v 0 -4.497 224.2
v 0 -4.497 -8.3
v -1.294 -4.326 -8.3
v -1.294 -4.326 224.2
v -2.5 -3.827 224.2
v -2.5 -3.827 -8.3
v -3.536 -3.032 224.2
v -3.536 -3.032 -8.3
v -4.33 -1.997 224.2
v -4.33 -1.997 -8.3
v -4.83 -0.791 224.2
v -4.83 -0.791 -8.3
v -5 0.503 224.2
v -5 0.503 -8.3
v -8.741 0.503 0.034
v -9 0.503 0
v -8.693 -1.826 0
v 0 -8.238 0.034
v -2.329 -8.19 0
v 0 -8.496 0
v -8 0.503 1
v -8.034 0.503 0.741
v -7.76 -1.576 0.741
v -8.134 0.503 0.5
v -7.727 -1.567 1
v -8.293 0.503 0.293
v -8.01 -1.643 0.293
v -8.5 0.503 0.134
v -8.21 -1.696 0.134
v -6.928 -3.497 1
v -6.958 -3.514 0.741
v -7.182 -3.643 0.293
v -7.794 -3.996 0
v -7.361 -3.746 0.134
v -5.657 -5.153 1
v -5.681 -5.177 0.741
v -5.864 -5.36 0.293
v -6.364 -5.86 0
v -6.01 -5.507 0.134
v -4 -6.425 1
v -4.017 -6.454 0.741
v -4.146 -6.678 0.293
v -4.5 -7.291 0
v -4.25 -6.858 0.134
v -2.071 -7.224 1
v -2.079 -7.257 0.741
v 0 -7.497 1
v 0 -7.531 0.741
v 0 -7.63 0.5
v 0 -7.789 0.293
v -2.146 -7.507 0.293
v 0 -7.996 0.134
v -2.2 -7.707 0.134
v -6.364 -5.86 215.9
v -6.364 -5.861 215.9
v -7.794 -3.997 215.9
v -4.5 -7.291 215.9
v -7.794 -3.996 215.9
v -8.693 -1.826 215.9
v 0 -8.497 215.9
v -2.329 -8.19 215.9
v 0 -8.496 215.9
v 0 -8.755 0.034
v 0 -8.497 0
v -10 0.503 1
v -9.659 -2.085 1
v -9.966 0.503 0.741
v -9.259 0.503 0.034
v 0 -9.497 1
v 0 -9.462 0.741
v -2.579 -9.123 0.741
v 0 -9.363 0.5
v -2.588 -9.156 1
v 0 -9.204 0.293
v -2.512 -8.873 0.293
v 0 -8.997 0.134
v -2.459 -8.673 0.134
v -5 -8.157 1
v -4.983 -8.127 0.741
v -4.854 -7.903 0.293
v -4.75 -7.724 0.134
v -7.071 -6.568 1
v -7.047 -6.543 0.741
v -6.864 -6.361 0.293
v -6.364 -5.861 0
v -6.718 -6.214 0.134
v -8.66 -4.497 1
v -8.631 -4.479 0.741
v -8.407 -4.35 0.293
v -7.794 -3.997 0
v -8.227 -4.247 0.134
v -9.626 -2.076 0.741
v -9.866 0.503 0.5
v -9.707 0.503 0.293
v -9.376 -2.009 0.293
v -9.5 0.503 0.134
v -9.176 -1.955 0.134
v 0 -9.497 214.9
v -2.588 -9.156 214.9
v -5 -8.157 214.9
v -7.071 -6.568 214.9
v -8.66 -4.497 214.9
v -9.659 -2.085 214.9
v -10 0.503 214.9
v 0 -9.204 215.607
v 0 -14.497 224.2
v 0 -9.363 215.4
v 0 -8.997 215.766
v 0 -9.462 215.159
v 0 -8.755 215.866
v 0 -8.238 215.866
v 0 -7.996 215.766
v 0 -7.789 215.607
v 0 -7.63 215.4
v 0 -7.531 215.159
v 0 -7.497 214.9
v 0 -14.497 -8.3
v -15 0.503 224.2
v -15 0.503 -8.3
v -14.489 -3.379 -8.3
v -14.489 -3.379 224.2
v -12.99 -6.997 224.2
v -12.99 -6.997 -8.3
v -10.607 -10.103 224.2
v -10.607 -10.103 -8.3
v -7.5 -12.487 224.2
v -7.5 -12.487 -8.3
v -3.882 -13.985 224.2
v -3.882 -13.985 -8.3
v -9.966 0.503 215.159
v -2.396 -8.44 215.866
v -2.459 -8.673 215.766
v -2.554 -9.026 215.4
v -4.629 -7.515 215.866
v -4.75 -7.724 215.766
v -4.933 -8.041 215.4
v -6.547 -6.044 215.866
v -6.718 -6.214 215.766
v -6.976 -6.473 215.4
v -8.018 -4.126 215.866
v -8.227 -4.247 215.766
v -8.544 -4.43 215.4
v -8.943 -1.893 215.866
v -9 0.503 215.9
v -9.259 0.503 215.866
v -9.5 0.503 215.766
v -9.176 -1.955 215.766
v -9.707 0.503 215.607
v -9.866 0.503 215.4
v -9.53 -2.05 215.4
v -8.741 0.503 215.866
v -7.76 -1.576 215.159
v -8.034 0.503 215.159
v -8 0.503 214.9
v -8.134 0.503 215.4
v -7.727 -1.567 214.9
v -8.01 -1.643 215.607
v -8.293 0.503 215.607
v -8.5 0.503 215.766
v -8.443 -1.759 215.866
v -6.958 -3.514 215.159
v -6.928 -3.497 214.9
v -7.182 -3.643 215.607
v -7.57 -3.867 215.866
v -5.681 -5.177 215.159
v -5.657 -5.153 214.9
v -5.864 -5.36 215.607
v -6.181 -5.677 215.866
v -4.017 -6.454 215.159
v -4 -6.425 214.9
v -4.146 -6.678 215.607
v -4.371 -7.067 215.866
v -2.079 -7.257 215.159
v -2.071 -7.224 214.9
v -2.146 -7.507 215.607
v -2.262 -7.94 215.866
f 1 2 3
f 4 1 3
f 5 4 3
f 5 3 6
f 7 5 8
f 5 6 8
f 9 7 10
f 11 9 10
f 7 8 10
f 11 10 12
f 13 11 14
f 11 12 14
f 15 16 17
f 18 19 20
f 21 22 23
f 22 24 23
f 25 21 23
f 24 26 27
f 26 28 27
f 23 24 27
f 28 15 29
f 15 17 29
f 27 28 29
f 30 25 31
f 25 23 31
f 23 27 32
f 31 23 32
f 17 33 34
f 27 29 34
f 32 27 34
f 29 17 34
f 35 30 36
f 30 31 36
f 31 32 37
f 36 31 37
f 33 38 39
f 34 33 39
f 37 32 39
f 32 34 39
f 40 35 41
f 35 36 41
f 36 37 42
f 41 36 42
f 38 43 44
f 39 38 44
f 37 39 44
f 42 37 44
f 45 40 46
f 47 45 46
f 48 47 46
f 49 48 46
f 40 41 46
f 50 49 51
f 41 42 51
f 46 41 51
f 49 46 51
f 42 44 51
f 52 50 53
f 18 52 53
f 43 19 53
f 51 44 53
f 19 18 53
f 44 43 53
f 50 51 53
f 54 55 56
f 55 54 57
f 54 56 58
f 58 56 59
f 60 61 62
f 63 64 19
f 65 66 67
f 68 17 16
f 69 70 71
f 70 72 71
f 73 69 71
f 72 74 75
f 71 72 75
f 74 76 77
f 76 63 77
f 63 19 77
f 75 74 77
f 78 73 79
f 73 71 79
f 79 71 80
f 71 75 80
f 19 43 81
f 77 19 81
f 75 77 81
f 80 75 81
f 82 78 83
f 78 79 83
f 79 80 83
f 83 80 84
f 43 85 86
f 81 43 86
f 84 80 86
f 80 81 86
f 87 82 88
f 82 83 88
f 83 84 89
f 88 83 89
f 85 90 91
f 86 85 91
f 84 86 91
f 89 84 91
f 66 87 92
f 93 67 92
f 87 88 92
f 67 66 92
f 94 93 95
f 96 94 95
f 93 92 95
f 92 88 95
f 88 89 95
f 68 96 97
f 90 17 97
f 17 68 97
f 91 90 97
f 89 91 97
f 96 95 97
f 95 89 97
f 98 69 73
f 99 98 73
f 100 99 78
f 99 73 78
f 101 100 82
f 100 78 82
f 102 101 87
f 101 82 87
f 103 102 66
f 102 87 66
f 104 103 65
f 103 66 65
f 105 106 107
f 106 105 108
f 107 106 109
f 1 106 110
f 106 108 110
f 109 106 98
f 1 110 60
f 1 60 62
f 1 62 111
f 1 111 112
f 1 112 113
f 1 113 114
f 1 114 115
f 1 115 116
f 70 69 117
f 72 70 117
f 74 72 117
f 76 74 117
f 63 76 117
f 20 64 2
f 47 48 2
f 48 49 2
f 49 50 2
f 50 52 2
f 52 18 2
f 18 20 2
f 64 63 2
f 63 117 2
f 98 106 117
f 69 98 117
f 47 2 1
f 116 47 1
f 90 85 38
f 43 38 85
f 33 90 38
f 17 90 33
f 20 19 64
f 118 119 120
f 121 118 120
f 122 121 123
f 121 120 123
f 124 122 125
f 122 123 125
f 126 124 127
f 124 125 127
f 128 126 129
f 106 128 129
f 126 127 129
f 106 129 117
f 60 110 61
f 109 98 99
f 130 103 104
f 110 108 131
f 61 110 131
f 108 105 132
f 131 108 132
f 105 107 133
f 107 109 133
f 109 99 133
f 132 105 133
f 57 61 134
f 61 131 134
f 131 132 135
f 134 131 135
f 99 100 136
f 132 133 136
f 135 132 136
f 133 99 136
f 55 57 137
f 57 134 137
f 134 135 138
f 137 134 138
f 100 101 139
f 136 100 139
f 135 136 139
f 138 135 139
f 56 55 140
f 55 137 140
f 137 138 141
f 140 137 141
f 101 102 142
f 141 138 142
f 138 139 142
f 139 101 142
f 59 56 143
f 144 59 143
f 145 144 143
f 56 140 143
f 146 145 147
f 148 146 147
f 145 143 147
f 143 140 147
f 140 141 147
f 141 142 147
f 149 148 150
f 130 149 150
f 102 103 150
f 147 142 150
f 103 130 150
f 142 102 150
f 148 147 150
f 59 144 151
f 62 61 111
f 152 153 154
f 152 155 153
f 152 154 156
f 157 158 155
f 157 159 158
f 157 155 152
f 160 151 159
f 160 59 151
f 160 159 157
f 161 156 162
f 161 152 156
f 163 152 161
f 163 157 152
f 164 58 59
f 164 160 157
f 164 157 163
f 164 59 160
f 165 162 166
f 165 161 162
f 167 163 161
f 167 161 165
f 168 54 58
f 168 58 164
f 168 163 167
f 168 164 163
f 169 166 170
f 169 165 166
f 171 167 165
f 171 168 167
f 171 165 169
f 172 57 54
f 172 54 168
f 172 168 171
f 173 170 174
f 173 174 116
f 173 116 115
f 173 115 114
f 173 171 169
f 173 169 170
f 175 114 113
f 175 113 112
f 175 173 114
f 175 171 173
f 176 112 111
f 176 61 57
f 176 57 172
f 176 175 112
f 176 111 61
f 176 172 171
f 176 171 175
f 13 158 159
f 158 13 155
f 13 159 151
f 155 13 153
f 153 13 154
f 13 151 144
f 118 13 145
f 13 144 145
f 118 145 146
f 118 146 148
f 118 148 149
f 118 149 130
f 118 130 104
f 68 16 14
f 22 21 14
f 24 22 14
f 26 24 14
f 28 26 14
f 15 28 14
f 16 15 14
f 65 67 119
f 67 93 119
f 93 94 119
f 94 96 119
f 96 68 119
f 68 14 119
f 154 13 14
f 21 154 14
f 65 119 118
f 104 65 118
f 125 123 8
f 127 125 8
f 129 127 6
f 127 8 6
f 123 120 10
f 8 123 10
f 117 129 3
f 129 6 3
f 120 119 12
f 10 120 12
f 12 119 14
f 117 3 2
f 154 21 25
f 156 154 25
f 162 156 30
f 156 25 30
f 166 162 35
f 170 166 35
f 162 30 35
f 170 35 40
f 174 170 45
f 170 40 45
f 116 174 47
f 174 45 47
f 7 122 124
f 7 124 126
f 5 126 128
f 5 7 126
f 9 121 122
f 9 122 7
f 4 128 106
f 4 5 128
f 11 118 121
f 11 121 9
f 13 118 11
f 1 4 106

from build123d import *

# Parameters (mm, degrees)
BOSS_EXTRUDE1_DEPTH   = 215.9
BOSS_EXTRUDE1_2_DEPTH = 215.9
BOSS_EXTRUDE2_DEPTH   = 8.3
BOSS_EXTRUDE3_START   = 8.3
BOSS_EXTRUDE3_DEPTH   = 8.3
FILLET1_R             = 1


with BuildPart() as part:
    # Sketch1 → Boss-Extrude1 (new body)
    with BuildSketch(Plane.XY):
        with BuildLine():
            Line((-5, 0.503476918), (-8, 0.503476918))
            ThreePointArc((-8, 0.503476918), (-5.656854249, -5.153377331), (0, -7.496523082))
            Line((0, -7.496523082), (0, -4.496523082))
            ThreePointArc((0, -4.496523082), (-3.535533906, -3.032056988), (-5, 0.503476918))
        make_face()
    extrude(amount=BOSS_EXTRUDE1_DEPTH)



with BuildPart() as body_2:
    # Sketch1 → Boss-Extrude1 2 (new body)
    with BuildSketch(Plane.XY):
        with BuildLine():
            Line((-10, 0.503476918), (-15, 0.503476918))
            ThreePointArc((-15, 0.503476918), (-10.606601718, -10.1031248), (0, -14.496523082))
            Line((0, -14.496523082), (0, -9.496523082))
            ThreePointArc((0, -9.496523082), (-7.071067812, -6.567590894), (-10, 0.503476918))
        make_face()
    extrude(amount=BOSS_EXTRUDE1_2_DEPTH)


with BuildPart() as part_1:
    add(part.part)

    add(body_2.part)  # Boss-Extrude2 merges body 2
    # Sketch2 → Boss-Extrude2 (add)
    with BuildSketch(Plane.XY.offset(215.9)):
        with BuildLine():
            Line((-5, 0.503476918), (-15, 0.503476918))
            ThreePointArc((-15, 0.503476918), (-10.606601718, -10.1031248), (0, -14.496523082))
            Line((0, -14.496523082), (0, -4.496523082))
            ThreePointArc((0, -4.496523082), (-3.535533906, -3.032056988), (-5, 0.503476918))
        make_face()
    extrude(amount=BOSS_EXTRUDE2_DEPTH)

    # Sketch3 → Boss-Extrude3 (add)
    with BuildSketch(Plane(origin=(0, 0, 0), x_dir=(-1, 0, 0), z_dir=(0, 0, -1)).offset(BOSS_EXTRUDE3_START)):
        with BuildLine():
            Line((5, 0.503476918), (15, 0.503476918))
            ThreePointArc((15, 0.503476918), (10.606601718, -10.1031248), (0, -14.496523082))
            Line((0, -14.496523082), (0, -4.496523082))
            ThreePointArc((0, -4.496523082), (3.535533906, -3.032056988), (5, 0.503476918))
        make_face()
    extrude(amount=-BOSS_EXTRUDE3_DEPTH)

    # Fillet1
    fillet1_edges = [part_1.edges().sort_by_distance(p)[0] for p in [
        (-5.656854249, -5.153377331, 0),
        (-7.071067812, -6.567590894, 0),
        (-5.656854249, -5.153377331, 215.9),
        (-7.071067812, -6.567590894, 215.9),
    ]]
    fillet(fillet1_edges, radius=FILLET1_R - 0.0001)  # a hair under: the kernel refuses the full size


solid = part_1.part
